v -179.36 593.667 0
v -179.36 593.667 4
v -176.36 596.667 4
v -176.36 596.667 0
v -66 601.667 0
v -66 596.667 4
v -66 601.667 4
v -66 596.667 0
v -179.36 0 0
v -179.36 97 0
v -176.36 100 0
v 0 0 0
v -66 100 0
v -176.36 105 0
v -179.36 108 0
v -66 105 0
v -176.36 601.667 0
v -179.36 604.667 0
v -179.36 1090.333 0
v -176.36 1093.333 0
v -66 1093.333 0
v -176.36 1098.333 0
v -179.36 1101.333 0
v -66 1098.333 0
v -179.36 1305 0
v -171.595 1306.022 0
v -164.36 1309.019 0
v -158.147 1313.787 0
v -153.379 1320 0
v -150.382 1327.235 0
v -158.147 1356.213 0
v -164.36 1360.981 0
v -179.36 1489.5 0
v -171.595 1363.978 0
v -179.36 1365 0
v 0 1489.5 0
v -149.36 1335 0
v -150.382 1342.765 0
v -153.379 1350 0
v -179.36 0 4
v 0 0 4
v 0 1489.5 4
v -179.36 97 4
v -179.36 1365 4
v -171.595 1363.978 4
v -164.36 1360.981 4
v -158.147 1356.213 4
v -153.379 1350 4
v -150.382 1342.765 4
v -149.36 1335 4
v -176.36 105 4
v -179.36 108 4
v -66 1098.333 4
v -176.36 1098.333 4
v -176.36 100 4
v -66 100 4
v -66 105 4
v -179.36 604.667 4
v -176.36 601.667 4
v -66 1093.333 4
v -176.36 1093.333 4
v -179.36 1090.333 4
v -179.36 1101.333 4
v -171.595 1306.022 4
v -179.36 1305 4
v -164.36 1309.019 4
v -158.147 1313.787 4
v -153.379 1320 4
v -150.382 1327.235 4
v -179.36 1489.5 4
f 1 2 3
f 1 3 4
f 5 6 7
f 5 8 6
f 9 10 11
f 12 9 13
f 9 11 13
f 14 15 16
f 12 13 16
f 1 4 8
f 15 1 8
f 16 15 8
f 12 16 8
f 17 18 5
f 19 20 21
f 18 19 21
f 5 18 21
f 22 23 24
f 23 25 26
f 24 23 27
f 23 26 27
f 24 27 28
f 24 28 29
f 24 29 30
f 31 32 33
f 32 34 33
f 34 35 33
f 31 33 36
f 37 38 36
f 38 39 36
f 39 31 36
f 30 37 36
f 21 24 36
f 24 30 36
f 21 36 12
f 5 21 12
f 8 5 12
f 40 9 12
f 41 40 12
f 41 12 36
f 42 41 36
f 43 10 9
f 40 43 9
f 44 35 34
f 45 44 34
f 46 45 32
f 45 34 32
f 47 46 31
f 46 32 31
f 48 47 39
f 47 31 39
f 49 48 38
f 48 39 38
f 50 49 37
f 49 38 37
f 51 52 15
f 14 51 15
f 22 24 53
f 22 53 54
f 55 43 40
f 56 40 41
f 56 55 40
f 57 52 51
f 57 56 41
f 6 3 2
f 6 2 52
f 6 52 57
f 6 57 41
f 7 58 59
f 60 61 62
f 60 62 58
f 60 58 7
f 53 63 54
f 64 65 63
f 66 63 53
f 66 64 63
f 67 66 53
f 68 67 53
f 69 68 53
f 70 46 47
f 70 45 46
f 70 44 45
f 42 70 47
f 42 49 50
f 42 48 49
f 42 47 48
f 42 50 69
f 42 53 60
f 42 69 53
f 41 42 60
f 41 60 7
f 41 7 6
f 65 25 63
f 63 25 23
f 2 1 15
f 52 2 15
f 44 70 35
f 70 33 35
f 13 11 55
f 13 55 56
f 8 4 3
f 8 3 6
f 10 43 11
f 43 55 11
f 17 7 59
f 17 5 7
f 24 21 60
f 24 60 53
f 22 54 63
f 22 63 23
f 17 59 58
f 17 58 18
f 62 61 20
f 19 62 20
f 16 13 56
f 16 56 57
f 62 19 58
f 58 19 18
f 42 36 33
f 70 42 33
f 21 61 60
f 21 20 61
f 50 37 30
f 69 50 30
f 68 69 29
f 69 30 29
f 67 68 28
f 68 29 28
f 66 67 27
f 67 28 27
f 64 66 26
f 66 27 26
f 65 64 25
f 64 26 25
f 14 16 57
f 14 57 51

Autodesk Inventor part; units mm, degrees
ref_plane "YZ Plane" through (0, 0, 0) normal (1, 0, 0) x (0, 1, 0)
ref_plane "XZ Plane" through (0, 0, 0) normal (0, 1, 0) x (-1, 0, 0)
ref_plane "XY Plane" through (0, 0, 0) normal (0, 0, 1) x (1, 0, 0)
sketch "Sketch1" plane through (0, 0, 0) normal (0, 0, 1) x (1, 0, 0)
  line L0 (0, 1489.5) -> (-179.3598, 1489.5)
  line L1 (-179.3598, 1489.5) -> (-179.3598, 0)
  line L2 (-179.3598, 0) -> (0, 0)
  line L3 (0, 0) -> (0, 1489.5)
  line L4 (-179.3598, 100) -> (-66, 100)
  line L5 (-66, 100) -> (-66, 105)
  line L6 (-66, 105) -> (-179.3598, 105)
  line L7 (-179.3598, 105) -> (-179.3598, 100)
  line L8 (-179.3598, 596.6667) -> (-66, 596.6667)
  line L9 (-66, 596.6667) -> (-66, 601.6667)
  line L10 (-66, 601.6667) -> (-179.3598, 601.6667)
  line L11 (-179.3598, 601.6667) -> (-179.3598, 596.6667)
  line L12 (-179.3598, 1093.3333) -> (-66, 1093.3333)
  line L13 (-66, 1093.3333) -> (-66, 1098.3333)
  line L14 (-66, 1098.3333) -> (-179.3598, 1098.3333)
  line L15 (-179.3598, 1098.3333) -> (-179.3598, 1093.3333)
  circle A0 centre (-179.3598, 1335) radius 30
  point P0 (-179.3598, 1093.3333)
  point P1 (-179.3598, 596.6667)
  point P2 (-179.3598, 1365)
  point P3 (-179.3598, 1305)
  dimension "d0" = 1489.5
  dimension "d1" = 179.3598
  dimension "d2" = 5
  dimension "d4" = 100
  dimension "d7" = 496.6667
  dimension "d23" = 66
  dimension "d29" = 60
  dimension "d30" = 1335
extrude "Plate1" add sketch "Sketch1" along normal blind 4 contours L3 L2 L1 L4 L5 L6 L8 L9 L10 L12 L13 L14 A0 L0
chamfer "Corner Chamfer1" distance 3 angle 45 6 edges at (-179.3598, 100, 2) (-179.3598, 105, 2) (-179.3598, 596.6667, 2) (-179.3598, 601.6667, 2) (-179.3598, 1098.3333, 2) (-179.3598, 1093.3333, 2)
equation "\"d0\" = Стрингер_длина"
equation "\"d1\" = стрингер_глубина_2"
equation "\"d2\" = паз_под_стрингер_толщина"
equation "\"d7\" = Шаг_шпангоутов"
equation "\"d23\" = паз_под_стрингер_глубина - Thickness"
equation "\"d29\" = 2 * радиус_выреза_под_сварку"
equation "\"d12\" = Thickness"
equation "\"BendRadius\" = Thickness"
equation "\"BendReliefWidth\" = Thickness"
equation "\"BendReliefDepth\" = 0.5 * Thickness"
equation "\"CornerReliefSize\" = 4 * Thickness"
equation "\"MinimumRemnant\" = 2 * Thickness"
equation "\"TransitionRadius\" = BendRadius"
equation "\"JacobiRadiusSize\" = BendRadius"
equation "\"GapSize\" = Thickness"
equation "\"Стрингер_длина\" = 1489.5"
equation "\"стрингер_глубина_2\" = 179.359772"
equation "\"паз_под_стрингер_толщина\" = 5"
equation "\"Шаг_шпангоутов\" = 496.666667"
equation "\"паз_под_стрингер_глубина\" = 70"
equation "\"Thickness\" = 4"
equation "\"радиус_выреза_под_сварку\" = 30"
properties part number "GBK 3114 stringer 2" material "Steel"
